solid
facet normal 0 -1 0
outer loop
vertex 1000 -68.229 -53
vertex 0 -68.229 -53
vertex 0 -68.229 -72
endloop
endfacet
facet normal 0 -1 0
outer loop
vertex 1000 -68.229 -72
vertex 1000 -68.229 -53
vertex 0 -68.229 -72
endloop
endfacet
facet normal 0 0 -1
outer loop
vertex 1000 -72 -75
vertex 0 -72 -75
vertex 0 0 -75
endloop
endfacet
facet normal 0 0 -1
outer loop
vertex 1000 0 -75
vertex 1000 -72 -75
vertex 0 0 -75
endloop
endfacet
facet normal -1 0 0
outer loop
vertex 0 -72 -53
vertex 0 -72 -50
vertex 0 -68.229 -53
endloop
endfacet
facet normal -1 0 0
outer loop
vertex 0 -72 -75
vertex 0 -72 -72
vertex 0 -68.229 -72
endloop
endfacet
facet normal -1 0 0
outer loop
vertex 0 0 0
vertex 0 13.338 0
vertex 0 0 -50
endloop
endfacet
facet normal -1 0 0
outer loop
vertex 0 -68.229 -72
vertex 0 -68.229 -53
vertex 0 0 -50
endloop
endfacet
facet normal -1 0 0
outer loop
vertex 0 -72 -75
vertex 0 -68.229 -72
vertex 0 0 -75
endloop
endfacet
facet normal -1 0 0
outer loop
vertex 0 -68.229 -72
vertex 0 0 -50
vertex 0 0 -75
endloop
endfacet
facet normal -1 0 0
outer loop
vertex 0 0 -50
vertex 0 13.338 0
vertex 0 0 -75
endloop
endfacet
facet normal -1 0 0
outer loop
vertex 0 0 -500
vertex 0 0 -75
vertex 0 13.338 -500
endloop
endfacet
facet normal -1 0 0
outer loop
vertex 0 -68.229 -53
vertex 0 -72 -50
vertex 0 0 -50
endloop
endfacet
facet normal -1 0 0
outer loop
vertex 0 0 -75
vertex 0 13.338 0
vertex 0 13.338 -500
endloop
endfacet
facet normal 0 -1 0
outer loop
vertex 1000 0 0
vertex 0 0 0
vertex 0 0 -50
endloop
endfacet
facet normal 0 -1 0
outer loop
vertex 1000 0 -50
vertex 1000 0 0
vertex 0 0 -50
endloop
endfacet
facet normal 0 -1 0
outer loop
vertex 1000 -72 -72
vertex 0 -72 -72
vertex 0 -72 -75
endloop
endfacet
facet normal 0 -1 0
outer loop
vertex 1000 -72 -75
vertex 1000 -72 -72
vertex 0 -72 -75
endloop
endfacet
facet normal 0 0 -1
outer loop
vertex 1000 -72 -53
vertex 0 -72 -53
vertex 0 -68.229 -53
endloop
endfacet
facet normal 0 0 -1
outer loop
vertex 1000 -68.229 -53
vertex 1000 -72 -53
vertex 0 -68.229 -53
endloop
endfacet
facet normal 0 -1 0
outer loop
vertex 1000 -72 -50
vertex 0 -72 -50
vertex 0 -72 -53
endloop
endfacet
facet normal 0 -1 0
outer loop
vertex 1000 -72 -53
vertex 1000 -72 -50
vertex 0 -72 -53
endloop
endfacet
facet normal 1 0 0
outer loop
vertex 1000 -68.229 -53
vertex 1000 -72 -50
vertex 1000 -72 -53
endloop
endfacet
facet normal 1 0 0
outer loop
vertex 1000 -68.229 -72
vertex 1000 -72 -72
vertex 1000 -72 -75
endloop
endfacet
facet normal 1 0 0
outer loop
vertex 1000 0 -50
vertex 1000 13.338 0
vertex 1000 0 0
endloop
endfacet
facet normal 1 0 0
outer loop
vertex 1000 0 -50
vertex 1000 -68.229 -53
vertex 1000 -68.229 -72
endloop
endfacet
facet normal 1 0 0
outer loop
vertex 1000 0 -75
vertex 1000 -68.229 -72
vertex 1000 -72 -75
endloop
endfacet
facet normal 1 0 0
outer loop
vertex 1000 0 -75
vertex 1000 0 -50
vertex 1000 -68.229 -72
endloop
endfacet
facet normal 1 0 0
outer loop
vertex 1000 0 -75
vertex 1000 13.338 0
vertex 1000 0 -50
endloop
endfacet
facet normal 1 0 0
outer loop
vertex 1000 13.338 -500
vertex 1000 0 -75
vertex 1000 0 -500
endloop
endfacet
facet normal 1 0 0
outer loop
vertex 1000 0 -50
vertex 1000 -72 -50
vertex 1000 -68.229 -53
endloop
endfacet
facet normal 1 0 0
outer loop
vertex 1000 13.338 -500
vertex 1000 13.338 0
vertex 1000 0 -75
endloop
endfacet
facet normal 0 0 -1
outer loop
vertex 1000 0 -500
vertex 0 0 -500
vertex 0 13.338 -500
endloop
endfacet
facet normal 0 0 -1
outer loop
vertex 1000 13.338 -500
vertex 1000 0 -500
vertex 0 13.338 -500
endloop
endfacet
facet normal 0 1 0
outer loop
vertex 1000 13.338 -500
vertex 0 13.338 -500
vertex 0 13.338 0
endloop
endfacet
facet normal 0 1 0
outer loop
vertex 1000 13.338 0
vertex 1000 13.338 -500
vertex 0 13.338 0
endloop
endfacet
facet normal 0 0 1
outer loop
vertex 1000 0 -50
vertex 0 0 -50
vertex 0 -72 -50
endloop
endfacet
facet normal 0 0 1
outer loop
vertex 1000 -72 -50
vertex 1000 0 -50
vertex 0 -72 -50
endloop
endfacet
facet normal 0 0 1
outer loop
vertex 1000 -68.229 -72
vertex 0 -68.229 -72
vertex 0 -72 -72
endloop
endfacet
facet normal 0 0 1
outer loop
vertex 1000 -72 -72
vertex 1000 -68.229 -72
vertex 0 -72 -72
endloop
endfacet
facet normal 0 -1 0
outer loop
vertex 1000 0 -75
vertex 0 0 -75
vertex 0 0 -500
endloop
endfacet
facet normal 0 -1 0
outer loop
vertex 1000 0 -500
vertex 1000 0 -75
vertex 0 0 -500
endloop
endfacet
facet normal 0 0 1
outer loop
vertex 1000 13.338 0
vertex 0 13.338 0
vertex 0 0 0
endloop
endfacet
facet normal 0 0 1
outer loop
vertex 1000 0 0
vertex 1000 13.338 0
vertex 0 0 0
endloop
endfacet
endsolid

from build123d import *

# Parameters (mm, degrees)
SKETCH1_W           = 19
SKETCH1_H           = 68.229050279
BOSS_EXTRUDE1_DEPTH = 1000


with BuildPart() as part:
    # Sketch1 → Boss-Extrude1 (new body)
    with BuildSketch(Plane(origin=(0, 0, 0), x_dir=(0, 0, -1), z_dir=(1, 0, 0))):
        Polygon((0, 13.337988827), (0, 0), (50, 0), (53, 0), (72, 0), (75, 0), (500, 0), (500, 13.337988827), align=None)
        Polygon((53, 0), (50, 0), (50, -72), (53, -72), (53, -68.229050279), align=None)
        with Locations((62.5, -34.11452514)):
            Rectangle(SKETCH1_W, SKETCH1_H)
        Polygon((75, 0), (72, 0), (72, -68.229050279), (72, -72), (75, -72), align=None)
    extrude(amount=BOSS_EXTRUDE1_DEPTH)


solid = part.part
